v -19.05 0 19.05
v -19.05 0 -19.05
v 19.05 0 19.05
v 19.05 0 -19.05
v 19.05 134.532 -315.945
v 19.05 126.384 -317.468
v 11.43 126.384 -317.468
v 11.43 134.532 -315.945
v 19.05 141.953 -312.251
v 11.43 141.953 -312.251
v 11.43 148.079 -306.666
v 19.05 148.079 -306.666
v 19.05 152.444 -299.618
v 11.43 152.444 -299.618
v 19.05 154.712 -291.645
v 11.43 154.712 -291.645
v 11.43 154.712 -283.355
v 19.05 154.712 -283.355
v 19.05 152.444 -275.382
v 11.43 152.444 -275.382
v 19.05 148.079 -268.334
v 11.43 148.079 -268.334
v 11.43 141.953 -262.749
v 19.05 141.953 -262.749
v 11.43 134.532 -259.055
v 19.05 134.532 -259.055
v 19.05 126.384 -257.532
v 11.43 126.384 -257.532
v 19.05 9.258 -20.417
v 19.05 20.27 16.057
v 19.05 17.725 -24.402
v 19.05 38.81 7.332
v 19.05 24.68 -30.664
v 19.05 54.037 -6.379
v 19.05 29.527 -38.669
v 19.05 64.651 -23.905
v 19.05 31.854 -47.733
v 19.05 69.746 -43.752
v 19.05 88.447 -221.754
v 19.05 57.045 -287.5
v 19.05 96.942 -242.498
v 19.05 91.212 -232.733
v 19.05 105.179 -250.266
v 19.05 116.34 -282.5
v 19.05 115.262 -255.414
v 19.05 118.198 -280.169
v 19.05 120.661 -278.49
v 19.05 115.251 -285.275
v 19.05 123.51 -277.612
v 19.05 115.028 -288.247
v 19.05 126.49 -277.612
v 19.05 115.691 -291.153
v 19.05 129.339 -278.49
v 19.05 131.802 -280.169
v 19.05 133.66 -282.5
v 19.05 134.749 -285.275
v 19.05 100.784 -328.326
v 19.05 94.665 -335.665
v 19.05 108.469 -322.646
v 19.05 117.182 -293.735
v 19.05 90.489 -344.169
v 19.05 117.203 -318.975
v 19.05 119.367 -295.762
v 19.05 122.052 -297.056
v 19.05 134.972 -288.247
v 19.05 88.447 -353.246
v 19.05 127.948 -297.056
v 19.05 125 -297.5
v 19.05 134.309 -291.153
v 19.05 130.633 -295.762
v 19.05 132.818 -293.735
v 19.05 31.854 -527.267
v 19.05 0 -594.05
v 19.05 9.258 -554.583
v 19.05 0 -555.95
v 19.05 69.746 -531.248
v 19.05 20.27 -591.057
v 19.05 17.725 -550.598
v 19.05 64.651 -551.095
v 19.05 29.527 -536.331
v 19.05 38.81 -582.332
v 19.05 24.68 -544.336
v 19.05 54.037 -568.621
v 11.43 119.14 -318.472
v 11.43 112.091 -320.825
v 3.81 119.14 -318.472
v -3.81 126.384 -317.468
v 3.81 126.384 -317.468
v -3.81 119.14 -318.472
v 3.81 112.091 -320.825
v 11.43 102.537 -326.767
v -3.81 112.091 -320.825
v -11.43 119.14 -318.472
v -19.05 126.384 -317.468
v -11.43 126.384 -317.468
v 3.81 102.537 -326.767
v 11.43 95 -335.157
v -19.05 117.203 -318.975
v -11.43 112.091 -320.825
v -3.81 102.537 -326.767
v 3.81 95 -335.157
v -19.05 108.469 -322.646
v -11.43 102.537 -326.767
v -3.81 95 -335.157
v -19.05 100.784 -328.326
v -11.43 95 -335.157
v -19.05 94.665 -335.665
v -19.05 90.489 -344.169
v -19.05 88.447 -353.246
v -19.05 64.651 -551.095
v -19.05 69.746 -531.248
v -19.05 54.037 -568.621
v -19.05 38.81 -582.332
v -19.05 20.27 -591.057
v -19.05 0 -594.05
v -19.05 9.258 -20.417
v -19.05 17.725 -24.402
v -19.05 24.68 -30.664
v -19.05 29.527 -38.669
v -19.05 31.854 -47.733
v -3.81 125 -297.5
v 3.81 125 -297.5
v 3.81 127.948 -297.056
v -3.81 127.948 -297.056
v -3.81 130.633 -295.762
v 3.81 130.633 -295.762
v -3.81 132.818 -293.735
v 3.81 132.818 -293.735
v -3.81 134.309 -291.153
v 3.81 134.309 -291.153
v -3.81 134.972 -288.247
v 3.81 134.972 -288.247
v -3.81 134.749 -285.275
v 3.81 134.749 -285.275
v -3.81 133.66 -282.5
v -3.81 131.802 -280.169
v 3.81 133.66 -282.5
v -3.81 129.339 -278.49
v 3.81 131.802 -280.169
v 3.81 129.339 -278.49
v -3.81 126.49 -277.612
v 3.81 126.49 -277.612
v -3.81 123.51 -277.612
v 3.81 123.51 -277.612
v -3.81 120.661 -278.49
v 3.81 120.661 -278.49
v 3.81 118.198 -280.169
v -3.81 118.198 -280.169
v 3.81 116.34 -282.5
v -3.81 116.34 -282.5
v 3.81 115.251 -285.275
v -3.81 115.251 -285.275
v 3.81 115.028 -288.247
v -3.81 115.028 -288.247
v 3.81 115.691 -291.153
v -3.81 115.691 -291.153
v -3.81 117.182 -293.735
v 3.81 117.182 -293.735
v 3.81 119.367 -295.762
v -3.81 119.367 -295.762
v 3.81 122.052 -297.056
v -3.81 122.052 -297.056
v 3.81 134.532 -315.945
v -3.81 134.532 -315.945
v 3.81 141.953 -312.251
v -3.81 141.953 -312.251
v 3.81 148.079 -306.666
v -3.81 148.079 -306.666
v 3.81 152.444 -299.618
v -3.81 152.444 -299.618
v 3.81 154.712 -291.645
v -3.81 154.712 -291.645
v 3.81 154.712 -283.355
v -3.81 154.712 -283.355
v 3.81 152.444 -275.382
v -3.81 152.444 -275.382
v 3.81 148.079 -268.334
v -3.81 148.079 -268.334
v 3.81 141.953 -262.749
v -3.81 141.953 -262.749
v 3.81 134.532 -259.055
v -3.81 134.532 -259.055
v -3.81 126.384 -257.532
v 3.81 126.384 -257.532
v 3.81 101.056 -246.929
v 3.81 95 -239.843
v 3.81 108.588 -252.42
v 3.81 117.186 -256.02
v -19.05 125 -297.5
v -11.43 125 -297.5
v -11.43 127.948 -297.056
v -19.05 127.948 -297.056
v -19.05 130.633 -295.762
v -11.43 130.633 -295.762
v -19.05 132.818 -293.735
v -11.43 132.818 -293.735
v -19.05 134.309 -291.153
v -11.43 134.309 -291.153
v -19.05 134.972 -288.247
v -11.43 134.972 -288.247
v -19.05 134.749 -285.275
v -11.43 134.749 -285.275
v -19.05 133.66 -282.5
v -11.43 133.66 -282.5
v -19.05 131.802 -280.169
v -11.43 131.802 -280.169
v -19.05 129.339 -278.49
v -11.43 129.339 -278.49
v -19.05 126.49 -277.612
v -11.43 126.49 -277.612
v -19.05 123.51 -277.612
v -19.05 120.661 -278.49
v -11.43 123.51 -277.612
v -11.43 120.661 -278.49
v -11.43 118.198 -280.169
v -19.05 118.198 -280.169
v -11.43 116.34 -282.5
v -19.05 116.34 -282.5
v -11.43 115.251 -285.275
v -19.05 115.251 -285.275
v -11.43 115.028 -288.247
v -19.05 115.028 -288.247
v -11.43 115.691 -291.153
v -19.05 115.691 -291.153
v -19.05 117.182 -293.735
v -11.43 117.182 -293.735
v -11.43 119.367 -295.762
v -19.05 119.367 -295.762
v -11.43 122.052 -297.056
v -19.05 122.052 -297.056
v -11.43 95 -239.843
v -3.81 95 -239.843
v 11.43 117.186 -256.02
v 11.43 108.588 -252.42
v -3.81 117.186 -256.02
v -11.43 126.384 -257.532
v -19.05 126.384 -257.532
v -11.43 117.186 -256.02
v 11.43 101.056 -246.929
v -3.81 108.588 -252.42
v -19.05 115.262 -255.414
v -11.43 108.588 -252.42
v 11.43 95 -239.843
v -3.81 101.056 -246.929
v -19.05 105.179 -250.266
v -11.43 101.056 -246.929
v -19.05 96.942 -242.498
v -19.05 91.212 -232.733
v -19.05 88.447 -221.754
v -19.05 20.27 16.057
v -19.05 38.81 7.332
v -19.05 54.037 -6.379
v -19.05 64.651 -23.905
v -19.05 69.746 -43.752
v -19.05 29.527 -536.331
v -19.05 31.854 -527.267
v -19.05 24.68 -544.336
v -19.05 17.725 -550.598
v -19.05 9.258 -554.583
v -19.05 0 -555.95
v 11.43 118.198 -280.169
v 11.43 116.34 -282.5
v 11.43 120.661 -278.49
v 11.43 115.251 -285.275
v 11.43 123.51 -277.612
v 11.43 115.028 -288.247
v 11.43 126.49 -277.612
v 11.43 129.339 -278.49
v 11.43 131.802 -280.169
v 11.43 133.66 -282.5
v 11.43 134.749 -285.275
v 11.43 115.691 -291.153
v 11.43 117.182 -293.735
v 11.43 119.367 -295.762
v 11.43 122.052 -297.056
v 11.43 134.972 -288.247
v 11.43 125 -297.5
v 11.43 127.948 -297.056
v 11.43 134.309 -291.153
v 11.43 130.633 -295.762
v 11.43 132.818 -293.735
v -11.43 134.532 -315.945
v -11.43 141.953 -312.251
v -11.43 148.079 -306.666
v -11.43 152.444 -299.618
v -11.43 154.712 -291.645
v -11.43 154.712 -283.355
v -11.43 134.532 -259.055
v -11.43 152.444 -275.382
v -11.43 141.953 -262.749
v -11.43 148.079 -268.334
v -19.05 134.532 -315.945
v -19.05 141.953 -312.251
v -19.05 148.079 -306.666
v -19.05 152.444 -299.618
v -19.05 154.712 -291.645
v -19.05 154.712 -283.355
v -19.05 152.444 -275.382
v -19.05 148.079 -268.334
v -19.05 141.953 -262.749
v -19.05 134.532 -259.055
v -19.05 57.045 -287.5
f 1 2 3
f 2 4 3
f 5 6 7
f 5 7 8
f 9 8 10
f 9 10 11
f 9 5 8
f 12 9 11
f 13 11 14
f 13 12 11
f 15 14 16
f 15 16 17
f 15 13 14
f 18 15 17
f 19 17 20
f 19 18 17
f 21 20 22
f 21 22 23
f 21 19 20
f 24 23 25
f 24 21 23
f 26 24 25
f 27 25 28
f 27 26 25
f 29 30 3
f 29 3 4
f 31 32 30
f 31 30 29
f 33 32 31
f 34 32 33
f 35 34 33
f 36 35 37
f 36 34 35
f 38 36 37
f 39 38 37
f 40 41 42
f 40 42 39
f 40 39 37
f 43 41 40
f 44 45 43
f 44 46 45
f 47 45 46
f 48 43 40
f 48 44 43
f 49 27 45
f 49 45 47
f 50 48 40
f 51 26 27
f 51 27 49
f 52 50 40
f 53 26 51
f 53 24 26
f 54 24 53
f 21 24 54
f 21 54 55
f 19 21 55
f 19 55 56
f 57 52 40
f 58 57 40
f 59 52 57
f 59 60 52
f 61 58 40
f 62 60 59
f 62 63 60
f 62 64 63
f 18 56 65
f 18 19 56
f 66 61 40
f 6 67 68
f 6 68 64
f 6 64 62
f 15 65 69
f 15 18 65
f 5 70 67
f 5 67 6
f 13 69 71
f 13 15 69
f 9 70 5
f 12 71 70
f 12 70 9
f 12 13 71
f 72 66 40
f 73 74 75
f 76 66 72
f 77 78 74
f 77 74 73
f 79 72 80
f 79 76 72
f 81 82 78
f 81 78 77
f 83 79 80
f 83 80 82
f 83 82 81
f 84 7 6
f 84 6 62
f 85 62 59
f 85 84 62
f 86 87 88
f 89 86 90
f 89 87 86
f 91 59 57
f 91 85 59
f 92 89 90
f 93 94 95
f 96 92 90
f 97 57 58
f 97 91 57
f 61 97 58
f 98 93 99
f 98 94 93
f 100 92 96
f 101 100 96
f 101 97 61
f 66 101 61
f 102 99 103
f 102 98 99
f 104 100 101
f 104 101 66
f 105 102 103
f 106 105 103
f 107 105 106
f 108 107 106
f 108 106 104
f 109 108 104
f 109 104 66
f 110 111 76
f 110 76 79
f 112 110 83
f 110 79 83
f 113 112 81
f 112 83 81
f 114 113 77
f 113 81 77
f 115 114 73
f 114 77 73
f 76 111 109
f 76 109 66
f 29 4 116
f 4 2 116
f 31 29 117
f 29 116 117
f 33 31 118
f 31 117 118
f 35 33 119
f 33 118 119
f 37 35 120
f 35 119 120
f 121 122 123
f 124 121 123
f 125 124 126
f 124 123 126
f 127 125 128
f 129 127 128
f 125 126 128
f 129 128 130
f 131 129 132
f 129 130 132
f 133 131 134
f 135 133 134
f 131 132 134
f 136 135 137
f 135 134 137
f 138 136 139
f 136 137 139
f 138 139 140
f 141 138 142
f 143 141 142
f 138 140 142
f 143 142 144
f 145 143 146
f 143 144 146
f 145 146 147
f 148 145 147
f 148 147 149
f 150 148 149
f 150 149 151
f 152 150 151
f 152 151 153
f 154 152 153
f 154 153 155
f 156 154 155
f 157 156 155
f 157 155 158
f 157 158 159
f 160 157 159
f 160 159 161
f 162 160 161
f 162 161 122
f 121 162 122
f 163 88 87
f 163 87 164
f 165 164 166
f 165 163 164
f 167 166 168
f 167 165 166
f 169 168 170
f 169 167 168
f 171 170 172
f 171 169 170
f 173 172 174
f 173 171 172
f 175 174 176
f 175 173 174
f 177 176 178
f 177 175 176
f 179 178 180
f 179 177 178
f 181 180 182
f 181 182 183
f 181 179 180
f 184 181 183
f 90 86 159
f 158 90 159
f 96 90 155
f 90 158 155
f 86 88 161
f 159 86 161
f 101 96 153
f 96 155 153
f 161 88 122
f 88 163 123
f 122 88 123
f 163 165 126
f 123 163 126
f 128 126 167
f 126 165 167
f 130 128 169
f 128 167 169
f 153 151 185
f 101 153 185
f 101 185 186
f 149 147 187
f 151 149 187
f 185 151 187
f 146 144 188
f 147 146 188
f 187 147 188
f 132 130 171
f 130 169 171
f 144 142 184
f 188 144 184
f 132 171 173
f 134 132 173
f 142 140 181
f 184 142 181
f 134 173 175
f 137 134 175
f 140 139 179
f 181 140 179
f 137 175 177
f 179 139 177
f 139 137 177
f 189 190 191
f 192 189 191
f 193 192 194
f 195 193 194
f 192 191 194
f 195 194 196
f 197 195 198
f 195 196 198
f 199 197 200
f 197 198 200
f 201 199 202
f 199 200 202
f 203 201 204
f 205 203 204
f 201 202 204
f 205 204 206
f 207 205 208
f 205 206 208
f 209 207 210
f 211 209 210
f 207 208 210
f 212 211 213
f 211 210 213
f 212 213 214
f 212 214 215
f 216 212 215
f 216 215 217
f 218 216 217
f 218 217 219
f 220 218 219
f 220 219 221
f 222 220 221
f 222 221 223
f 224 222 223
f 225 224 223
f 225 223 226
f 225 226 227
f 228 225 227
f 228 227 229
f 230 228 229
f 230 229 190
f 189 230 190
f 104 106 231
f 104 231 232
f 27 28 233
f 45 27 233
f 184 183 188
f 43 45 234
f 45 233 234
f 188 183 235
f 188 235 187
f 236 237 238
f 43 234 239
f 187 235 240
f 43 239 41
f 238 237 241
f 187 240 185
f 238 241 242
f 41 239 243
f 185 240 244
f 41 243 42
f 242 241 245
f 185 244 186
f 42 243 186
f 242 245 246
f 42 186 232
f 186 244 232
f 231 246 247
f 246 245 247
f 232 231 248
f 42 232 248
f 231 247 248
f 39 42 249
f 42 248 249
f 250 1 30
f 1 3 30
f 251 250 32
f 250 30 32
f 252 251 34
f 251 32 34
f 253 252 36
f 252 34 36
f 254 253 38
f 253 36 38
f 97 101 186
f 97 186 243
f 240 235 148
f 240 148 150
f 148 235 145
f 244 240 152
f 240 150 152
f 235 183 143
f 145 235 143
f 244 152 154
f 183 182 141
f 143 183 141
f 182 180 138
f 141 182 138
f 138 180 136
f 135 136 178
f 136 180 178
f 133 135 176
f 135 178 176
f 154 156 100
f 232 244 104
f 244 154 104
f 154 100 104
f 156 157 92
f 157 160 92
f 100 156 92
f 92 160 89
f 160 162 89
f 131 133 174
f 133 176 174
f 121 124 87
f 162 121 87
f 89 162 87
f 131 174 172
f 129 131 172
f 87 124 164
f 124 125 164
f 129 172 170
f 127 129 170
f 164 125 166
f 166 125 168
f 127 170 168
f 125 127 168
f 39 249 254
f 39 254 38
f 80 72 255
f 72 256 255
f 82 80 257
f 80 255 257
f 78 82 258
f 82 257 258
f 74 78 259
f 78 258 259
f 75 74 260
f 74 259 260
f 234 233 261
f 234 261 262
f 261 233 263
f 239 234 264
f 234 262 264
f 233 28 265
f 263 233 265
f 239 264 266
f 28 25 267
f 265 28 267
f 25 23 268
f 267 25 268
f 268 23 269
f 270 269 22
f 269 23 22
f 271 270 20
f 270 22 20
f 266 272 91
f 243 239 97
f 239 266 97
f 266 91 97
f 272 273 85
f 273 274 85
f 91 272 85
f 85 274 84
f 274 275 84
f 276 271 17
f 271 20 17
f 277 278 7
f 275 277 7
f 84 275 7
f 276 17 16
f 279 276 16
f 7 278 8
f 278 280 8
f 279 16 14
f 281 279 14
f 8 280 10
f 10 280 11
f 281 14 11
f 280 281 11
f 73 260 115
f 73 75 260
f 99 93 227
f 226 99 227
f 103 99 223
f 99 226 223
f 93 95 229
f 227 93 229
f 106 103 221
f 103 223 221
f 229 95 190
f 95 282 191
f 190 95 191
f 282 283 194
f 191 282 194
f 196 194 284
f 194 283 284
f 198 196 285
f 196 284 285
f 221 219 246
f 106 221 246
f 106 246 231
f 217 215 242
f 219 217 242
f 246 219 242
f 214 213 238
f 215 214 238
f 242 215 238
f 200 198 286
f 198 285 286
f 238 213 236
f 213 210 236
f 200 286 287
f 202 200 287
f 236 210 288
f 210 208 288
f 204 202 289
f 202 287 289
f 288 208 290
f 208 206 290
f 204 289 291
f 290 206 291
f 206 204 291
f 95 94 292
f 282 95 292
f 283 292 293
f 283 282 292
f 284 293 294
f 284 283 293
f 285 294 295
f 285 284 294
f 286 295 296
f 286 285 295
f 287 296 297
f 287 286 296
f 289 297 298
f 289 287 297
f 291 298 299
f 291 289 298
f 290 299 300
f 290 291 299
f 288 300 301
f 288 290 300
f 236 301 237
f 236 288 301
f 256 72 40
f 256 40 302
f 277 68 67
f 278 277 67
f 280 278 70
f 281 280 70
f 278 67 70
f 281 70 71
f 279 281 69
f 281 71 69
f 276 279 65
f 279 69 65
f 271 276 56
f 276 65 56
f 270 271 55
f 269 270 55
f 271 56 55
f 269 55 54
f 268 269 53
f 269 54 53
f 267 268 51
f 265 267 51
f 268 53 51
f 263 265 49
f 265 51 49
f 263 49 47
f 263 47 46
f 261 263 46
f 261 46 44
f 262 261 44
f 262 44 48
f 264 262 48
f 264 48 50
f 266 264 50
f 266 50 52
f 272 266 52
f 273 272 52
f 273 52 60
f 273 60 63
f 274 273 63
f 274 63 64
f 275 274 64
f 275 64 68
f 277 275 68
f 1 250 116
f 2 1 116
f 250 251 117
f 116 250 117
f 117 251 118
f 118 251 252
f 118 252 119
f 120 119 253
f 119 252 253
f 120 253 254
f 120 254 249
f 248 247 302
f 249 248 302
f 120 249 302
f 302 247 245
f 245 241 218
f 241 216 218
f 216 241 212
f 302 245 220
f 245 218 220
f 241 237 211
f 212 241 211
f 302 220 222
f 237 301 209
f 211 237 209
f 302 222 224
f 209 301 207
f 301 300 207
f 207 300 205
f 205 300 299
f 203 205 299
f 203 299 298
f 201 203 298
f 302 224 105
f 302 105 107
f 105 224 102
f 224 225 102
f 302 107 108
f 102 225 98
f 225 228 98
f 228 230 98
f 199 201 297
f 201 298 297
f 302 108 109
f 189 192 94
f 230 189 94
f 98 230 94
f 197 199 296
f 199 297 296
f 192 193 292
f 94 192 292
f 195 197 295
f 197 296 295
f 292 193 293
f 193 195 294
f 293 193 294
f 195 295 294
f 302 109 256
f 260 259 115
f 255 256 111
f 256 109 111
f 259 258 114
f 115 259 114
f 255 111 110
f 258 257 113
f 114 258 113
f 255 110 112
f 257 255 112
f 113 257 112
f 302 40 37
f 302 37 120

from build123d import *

# Parameters (mm, degrees)
SKETCH2_W           = 38.1
SKETCH2_H           = 38.1
SKETCH3_R           = 10
BOSS_EXTRUDE1_DEPTH = 38.1
FILLET1_R           = 40
SKETCH4_W           = 7.62
SKETCH4_H           = 59.936155674
SKETCH4_H_2         = 35.777885711
CUT_EXTRUDE1_DEPTH  = 60


with BuildPart() as part:
    # Sweep1: sweep along a path in Sketch1
    with BuildLine(Plane(origin=(0, 0, 0), x_dir=(0, 0, -1), z_dir=(1, 0, 0))) as sweep1_path:
        ThreePointArc((0, 0), (13.120743049, 34.179685259), (45.742360428, 50.8))
        Line((45.742360428, 50.8), (287.5, 76.2))
        Line((287.5, 76.2), (529.257639572, 50.8))
        ThreePointArc((529.257639572, 50.8), (561.879256951, 34.179685259), (575, 0))
    # Sketch2 → Sweep1 (sweep)
    with BuildSketch(Plane(origin=(0, 0, 0), x_dir=(1, 0, 0), z_dir=(0, 1, 0))):
        Rectangle(SKETCH2_W, SKETCH2_H)
    sweep(path=sweep1_path.line, transition=Transition.RIGHT)

    # Sketch3 → Boss-Extrude1 (add)
    with BuildSketch(Plane(origin=(19.05, 0, 0), x_dir=(0, 0, -1), z_dir=(1, 0, 0))):
        with BuildLine():
            ThreePointArc((317.5, 125), (267.165990691, 147.057381201), (285.064795638, 95.099000356))
            Line((285.064795638, 95.099000356), (287.5, 95.354852419))
            Line((287.5, 95.354852419), (289.935204362, 95.099000356))
            ThreePointArc((289.935204362, 95.099000356), (309.557381201, 104.665990691), (317.5, 125))
        make_face()
        with Locations((287.5, 125)):
            Circle(SKETCH3_R, mode=Mode.SUBTRACT)
    extrude(amount=-BOSS_EXTRUDE1_DEPTH)

    # Fillet1
    fillet1_edges = [part.edges().sort_by_distance(p)[0] for p in [
        (0, 95.099000356, -289.935204362),
        (0, 95.099000356, -285.064795638),
    ]]
    fillet(fillet1_edges, radius=FILLET1_R)

    # Sketch4 → Cut-Extrude1 (cut)
    with BuildSketch(Plane(origin=(0, 155, 0), x_dir=(1, 0, 0), z_dir=(0, 1, 0))):
        with Locations((-7.62, 287.5)):
            Rectangle(SKETCH4_W, SKETCH4_H)
        with Locations((-7.62, 335.357020692)):
            Rectangle(SKETCH4_W, SKETCH4_H_2)
        with Locations((7.62, 335.357020692)):
            Rectangle(SKETCH4_W, SKETCH4_H_2)
        with Locations((7.62, 287.5)):
            Rectangle(SKETCH4_W, SKETCH4_H)
        with Locations((7.62, 239.642979308)):
            Rectangle(SKETCH4_W, SKETCH4_H_2)
        with Locations((-7.62, 239.642979308)):
            Rectangle(SKETCH4_W, SKETCH4_H_2)
    extrude(amount=-CUT_EXTRUDE1_DEPTH, mode=Mode.SUBTRACT)


solid = part.part
